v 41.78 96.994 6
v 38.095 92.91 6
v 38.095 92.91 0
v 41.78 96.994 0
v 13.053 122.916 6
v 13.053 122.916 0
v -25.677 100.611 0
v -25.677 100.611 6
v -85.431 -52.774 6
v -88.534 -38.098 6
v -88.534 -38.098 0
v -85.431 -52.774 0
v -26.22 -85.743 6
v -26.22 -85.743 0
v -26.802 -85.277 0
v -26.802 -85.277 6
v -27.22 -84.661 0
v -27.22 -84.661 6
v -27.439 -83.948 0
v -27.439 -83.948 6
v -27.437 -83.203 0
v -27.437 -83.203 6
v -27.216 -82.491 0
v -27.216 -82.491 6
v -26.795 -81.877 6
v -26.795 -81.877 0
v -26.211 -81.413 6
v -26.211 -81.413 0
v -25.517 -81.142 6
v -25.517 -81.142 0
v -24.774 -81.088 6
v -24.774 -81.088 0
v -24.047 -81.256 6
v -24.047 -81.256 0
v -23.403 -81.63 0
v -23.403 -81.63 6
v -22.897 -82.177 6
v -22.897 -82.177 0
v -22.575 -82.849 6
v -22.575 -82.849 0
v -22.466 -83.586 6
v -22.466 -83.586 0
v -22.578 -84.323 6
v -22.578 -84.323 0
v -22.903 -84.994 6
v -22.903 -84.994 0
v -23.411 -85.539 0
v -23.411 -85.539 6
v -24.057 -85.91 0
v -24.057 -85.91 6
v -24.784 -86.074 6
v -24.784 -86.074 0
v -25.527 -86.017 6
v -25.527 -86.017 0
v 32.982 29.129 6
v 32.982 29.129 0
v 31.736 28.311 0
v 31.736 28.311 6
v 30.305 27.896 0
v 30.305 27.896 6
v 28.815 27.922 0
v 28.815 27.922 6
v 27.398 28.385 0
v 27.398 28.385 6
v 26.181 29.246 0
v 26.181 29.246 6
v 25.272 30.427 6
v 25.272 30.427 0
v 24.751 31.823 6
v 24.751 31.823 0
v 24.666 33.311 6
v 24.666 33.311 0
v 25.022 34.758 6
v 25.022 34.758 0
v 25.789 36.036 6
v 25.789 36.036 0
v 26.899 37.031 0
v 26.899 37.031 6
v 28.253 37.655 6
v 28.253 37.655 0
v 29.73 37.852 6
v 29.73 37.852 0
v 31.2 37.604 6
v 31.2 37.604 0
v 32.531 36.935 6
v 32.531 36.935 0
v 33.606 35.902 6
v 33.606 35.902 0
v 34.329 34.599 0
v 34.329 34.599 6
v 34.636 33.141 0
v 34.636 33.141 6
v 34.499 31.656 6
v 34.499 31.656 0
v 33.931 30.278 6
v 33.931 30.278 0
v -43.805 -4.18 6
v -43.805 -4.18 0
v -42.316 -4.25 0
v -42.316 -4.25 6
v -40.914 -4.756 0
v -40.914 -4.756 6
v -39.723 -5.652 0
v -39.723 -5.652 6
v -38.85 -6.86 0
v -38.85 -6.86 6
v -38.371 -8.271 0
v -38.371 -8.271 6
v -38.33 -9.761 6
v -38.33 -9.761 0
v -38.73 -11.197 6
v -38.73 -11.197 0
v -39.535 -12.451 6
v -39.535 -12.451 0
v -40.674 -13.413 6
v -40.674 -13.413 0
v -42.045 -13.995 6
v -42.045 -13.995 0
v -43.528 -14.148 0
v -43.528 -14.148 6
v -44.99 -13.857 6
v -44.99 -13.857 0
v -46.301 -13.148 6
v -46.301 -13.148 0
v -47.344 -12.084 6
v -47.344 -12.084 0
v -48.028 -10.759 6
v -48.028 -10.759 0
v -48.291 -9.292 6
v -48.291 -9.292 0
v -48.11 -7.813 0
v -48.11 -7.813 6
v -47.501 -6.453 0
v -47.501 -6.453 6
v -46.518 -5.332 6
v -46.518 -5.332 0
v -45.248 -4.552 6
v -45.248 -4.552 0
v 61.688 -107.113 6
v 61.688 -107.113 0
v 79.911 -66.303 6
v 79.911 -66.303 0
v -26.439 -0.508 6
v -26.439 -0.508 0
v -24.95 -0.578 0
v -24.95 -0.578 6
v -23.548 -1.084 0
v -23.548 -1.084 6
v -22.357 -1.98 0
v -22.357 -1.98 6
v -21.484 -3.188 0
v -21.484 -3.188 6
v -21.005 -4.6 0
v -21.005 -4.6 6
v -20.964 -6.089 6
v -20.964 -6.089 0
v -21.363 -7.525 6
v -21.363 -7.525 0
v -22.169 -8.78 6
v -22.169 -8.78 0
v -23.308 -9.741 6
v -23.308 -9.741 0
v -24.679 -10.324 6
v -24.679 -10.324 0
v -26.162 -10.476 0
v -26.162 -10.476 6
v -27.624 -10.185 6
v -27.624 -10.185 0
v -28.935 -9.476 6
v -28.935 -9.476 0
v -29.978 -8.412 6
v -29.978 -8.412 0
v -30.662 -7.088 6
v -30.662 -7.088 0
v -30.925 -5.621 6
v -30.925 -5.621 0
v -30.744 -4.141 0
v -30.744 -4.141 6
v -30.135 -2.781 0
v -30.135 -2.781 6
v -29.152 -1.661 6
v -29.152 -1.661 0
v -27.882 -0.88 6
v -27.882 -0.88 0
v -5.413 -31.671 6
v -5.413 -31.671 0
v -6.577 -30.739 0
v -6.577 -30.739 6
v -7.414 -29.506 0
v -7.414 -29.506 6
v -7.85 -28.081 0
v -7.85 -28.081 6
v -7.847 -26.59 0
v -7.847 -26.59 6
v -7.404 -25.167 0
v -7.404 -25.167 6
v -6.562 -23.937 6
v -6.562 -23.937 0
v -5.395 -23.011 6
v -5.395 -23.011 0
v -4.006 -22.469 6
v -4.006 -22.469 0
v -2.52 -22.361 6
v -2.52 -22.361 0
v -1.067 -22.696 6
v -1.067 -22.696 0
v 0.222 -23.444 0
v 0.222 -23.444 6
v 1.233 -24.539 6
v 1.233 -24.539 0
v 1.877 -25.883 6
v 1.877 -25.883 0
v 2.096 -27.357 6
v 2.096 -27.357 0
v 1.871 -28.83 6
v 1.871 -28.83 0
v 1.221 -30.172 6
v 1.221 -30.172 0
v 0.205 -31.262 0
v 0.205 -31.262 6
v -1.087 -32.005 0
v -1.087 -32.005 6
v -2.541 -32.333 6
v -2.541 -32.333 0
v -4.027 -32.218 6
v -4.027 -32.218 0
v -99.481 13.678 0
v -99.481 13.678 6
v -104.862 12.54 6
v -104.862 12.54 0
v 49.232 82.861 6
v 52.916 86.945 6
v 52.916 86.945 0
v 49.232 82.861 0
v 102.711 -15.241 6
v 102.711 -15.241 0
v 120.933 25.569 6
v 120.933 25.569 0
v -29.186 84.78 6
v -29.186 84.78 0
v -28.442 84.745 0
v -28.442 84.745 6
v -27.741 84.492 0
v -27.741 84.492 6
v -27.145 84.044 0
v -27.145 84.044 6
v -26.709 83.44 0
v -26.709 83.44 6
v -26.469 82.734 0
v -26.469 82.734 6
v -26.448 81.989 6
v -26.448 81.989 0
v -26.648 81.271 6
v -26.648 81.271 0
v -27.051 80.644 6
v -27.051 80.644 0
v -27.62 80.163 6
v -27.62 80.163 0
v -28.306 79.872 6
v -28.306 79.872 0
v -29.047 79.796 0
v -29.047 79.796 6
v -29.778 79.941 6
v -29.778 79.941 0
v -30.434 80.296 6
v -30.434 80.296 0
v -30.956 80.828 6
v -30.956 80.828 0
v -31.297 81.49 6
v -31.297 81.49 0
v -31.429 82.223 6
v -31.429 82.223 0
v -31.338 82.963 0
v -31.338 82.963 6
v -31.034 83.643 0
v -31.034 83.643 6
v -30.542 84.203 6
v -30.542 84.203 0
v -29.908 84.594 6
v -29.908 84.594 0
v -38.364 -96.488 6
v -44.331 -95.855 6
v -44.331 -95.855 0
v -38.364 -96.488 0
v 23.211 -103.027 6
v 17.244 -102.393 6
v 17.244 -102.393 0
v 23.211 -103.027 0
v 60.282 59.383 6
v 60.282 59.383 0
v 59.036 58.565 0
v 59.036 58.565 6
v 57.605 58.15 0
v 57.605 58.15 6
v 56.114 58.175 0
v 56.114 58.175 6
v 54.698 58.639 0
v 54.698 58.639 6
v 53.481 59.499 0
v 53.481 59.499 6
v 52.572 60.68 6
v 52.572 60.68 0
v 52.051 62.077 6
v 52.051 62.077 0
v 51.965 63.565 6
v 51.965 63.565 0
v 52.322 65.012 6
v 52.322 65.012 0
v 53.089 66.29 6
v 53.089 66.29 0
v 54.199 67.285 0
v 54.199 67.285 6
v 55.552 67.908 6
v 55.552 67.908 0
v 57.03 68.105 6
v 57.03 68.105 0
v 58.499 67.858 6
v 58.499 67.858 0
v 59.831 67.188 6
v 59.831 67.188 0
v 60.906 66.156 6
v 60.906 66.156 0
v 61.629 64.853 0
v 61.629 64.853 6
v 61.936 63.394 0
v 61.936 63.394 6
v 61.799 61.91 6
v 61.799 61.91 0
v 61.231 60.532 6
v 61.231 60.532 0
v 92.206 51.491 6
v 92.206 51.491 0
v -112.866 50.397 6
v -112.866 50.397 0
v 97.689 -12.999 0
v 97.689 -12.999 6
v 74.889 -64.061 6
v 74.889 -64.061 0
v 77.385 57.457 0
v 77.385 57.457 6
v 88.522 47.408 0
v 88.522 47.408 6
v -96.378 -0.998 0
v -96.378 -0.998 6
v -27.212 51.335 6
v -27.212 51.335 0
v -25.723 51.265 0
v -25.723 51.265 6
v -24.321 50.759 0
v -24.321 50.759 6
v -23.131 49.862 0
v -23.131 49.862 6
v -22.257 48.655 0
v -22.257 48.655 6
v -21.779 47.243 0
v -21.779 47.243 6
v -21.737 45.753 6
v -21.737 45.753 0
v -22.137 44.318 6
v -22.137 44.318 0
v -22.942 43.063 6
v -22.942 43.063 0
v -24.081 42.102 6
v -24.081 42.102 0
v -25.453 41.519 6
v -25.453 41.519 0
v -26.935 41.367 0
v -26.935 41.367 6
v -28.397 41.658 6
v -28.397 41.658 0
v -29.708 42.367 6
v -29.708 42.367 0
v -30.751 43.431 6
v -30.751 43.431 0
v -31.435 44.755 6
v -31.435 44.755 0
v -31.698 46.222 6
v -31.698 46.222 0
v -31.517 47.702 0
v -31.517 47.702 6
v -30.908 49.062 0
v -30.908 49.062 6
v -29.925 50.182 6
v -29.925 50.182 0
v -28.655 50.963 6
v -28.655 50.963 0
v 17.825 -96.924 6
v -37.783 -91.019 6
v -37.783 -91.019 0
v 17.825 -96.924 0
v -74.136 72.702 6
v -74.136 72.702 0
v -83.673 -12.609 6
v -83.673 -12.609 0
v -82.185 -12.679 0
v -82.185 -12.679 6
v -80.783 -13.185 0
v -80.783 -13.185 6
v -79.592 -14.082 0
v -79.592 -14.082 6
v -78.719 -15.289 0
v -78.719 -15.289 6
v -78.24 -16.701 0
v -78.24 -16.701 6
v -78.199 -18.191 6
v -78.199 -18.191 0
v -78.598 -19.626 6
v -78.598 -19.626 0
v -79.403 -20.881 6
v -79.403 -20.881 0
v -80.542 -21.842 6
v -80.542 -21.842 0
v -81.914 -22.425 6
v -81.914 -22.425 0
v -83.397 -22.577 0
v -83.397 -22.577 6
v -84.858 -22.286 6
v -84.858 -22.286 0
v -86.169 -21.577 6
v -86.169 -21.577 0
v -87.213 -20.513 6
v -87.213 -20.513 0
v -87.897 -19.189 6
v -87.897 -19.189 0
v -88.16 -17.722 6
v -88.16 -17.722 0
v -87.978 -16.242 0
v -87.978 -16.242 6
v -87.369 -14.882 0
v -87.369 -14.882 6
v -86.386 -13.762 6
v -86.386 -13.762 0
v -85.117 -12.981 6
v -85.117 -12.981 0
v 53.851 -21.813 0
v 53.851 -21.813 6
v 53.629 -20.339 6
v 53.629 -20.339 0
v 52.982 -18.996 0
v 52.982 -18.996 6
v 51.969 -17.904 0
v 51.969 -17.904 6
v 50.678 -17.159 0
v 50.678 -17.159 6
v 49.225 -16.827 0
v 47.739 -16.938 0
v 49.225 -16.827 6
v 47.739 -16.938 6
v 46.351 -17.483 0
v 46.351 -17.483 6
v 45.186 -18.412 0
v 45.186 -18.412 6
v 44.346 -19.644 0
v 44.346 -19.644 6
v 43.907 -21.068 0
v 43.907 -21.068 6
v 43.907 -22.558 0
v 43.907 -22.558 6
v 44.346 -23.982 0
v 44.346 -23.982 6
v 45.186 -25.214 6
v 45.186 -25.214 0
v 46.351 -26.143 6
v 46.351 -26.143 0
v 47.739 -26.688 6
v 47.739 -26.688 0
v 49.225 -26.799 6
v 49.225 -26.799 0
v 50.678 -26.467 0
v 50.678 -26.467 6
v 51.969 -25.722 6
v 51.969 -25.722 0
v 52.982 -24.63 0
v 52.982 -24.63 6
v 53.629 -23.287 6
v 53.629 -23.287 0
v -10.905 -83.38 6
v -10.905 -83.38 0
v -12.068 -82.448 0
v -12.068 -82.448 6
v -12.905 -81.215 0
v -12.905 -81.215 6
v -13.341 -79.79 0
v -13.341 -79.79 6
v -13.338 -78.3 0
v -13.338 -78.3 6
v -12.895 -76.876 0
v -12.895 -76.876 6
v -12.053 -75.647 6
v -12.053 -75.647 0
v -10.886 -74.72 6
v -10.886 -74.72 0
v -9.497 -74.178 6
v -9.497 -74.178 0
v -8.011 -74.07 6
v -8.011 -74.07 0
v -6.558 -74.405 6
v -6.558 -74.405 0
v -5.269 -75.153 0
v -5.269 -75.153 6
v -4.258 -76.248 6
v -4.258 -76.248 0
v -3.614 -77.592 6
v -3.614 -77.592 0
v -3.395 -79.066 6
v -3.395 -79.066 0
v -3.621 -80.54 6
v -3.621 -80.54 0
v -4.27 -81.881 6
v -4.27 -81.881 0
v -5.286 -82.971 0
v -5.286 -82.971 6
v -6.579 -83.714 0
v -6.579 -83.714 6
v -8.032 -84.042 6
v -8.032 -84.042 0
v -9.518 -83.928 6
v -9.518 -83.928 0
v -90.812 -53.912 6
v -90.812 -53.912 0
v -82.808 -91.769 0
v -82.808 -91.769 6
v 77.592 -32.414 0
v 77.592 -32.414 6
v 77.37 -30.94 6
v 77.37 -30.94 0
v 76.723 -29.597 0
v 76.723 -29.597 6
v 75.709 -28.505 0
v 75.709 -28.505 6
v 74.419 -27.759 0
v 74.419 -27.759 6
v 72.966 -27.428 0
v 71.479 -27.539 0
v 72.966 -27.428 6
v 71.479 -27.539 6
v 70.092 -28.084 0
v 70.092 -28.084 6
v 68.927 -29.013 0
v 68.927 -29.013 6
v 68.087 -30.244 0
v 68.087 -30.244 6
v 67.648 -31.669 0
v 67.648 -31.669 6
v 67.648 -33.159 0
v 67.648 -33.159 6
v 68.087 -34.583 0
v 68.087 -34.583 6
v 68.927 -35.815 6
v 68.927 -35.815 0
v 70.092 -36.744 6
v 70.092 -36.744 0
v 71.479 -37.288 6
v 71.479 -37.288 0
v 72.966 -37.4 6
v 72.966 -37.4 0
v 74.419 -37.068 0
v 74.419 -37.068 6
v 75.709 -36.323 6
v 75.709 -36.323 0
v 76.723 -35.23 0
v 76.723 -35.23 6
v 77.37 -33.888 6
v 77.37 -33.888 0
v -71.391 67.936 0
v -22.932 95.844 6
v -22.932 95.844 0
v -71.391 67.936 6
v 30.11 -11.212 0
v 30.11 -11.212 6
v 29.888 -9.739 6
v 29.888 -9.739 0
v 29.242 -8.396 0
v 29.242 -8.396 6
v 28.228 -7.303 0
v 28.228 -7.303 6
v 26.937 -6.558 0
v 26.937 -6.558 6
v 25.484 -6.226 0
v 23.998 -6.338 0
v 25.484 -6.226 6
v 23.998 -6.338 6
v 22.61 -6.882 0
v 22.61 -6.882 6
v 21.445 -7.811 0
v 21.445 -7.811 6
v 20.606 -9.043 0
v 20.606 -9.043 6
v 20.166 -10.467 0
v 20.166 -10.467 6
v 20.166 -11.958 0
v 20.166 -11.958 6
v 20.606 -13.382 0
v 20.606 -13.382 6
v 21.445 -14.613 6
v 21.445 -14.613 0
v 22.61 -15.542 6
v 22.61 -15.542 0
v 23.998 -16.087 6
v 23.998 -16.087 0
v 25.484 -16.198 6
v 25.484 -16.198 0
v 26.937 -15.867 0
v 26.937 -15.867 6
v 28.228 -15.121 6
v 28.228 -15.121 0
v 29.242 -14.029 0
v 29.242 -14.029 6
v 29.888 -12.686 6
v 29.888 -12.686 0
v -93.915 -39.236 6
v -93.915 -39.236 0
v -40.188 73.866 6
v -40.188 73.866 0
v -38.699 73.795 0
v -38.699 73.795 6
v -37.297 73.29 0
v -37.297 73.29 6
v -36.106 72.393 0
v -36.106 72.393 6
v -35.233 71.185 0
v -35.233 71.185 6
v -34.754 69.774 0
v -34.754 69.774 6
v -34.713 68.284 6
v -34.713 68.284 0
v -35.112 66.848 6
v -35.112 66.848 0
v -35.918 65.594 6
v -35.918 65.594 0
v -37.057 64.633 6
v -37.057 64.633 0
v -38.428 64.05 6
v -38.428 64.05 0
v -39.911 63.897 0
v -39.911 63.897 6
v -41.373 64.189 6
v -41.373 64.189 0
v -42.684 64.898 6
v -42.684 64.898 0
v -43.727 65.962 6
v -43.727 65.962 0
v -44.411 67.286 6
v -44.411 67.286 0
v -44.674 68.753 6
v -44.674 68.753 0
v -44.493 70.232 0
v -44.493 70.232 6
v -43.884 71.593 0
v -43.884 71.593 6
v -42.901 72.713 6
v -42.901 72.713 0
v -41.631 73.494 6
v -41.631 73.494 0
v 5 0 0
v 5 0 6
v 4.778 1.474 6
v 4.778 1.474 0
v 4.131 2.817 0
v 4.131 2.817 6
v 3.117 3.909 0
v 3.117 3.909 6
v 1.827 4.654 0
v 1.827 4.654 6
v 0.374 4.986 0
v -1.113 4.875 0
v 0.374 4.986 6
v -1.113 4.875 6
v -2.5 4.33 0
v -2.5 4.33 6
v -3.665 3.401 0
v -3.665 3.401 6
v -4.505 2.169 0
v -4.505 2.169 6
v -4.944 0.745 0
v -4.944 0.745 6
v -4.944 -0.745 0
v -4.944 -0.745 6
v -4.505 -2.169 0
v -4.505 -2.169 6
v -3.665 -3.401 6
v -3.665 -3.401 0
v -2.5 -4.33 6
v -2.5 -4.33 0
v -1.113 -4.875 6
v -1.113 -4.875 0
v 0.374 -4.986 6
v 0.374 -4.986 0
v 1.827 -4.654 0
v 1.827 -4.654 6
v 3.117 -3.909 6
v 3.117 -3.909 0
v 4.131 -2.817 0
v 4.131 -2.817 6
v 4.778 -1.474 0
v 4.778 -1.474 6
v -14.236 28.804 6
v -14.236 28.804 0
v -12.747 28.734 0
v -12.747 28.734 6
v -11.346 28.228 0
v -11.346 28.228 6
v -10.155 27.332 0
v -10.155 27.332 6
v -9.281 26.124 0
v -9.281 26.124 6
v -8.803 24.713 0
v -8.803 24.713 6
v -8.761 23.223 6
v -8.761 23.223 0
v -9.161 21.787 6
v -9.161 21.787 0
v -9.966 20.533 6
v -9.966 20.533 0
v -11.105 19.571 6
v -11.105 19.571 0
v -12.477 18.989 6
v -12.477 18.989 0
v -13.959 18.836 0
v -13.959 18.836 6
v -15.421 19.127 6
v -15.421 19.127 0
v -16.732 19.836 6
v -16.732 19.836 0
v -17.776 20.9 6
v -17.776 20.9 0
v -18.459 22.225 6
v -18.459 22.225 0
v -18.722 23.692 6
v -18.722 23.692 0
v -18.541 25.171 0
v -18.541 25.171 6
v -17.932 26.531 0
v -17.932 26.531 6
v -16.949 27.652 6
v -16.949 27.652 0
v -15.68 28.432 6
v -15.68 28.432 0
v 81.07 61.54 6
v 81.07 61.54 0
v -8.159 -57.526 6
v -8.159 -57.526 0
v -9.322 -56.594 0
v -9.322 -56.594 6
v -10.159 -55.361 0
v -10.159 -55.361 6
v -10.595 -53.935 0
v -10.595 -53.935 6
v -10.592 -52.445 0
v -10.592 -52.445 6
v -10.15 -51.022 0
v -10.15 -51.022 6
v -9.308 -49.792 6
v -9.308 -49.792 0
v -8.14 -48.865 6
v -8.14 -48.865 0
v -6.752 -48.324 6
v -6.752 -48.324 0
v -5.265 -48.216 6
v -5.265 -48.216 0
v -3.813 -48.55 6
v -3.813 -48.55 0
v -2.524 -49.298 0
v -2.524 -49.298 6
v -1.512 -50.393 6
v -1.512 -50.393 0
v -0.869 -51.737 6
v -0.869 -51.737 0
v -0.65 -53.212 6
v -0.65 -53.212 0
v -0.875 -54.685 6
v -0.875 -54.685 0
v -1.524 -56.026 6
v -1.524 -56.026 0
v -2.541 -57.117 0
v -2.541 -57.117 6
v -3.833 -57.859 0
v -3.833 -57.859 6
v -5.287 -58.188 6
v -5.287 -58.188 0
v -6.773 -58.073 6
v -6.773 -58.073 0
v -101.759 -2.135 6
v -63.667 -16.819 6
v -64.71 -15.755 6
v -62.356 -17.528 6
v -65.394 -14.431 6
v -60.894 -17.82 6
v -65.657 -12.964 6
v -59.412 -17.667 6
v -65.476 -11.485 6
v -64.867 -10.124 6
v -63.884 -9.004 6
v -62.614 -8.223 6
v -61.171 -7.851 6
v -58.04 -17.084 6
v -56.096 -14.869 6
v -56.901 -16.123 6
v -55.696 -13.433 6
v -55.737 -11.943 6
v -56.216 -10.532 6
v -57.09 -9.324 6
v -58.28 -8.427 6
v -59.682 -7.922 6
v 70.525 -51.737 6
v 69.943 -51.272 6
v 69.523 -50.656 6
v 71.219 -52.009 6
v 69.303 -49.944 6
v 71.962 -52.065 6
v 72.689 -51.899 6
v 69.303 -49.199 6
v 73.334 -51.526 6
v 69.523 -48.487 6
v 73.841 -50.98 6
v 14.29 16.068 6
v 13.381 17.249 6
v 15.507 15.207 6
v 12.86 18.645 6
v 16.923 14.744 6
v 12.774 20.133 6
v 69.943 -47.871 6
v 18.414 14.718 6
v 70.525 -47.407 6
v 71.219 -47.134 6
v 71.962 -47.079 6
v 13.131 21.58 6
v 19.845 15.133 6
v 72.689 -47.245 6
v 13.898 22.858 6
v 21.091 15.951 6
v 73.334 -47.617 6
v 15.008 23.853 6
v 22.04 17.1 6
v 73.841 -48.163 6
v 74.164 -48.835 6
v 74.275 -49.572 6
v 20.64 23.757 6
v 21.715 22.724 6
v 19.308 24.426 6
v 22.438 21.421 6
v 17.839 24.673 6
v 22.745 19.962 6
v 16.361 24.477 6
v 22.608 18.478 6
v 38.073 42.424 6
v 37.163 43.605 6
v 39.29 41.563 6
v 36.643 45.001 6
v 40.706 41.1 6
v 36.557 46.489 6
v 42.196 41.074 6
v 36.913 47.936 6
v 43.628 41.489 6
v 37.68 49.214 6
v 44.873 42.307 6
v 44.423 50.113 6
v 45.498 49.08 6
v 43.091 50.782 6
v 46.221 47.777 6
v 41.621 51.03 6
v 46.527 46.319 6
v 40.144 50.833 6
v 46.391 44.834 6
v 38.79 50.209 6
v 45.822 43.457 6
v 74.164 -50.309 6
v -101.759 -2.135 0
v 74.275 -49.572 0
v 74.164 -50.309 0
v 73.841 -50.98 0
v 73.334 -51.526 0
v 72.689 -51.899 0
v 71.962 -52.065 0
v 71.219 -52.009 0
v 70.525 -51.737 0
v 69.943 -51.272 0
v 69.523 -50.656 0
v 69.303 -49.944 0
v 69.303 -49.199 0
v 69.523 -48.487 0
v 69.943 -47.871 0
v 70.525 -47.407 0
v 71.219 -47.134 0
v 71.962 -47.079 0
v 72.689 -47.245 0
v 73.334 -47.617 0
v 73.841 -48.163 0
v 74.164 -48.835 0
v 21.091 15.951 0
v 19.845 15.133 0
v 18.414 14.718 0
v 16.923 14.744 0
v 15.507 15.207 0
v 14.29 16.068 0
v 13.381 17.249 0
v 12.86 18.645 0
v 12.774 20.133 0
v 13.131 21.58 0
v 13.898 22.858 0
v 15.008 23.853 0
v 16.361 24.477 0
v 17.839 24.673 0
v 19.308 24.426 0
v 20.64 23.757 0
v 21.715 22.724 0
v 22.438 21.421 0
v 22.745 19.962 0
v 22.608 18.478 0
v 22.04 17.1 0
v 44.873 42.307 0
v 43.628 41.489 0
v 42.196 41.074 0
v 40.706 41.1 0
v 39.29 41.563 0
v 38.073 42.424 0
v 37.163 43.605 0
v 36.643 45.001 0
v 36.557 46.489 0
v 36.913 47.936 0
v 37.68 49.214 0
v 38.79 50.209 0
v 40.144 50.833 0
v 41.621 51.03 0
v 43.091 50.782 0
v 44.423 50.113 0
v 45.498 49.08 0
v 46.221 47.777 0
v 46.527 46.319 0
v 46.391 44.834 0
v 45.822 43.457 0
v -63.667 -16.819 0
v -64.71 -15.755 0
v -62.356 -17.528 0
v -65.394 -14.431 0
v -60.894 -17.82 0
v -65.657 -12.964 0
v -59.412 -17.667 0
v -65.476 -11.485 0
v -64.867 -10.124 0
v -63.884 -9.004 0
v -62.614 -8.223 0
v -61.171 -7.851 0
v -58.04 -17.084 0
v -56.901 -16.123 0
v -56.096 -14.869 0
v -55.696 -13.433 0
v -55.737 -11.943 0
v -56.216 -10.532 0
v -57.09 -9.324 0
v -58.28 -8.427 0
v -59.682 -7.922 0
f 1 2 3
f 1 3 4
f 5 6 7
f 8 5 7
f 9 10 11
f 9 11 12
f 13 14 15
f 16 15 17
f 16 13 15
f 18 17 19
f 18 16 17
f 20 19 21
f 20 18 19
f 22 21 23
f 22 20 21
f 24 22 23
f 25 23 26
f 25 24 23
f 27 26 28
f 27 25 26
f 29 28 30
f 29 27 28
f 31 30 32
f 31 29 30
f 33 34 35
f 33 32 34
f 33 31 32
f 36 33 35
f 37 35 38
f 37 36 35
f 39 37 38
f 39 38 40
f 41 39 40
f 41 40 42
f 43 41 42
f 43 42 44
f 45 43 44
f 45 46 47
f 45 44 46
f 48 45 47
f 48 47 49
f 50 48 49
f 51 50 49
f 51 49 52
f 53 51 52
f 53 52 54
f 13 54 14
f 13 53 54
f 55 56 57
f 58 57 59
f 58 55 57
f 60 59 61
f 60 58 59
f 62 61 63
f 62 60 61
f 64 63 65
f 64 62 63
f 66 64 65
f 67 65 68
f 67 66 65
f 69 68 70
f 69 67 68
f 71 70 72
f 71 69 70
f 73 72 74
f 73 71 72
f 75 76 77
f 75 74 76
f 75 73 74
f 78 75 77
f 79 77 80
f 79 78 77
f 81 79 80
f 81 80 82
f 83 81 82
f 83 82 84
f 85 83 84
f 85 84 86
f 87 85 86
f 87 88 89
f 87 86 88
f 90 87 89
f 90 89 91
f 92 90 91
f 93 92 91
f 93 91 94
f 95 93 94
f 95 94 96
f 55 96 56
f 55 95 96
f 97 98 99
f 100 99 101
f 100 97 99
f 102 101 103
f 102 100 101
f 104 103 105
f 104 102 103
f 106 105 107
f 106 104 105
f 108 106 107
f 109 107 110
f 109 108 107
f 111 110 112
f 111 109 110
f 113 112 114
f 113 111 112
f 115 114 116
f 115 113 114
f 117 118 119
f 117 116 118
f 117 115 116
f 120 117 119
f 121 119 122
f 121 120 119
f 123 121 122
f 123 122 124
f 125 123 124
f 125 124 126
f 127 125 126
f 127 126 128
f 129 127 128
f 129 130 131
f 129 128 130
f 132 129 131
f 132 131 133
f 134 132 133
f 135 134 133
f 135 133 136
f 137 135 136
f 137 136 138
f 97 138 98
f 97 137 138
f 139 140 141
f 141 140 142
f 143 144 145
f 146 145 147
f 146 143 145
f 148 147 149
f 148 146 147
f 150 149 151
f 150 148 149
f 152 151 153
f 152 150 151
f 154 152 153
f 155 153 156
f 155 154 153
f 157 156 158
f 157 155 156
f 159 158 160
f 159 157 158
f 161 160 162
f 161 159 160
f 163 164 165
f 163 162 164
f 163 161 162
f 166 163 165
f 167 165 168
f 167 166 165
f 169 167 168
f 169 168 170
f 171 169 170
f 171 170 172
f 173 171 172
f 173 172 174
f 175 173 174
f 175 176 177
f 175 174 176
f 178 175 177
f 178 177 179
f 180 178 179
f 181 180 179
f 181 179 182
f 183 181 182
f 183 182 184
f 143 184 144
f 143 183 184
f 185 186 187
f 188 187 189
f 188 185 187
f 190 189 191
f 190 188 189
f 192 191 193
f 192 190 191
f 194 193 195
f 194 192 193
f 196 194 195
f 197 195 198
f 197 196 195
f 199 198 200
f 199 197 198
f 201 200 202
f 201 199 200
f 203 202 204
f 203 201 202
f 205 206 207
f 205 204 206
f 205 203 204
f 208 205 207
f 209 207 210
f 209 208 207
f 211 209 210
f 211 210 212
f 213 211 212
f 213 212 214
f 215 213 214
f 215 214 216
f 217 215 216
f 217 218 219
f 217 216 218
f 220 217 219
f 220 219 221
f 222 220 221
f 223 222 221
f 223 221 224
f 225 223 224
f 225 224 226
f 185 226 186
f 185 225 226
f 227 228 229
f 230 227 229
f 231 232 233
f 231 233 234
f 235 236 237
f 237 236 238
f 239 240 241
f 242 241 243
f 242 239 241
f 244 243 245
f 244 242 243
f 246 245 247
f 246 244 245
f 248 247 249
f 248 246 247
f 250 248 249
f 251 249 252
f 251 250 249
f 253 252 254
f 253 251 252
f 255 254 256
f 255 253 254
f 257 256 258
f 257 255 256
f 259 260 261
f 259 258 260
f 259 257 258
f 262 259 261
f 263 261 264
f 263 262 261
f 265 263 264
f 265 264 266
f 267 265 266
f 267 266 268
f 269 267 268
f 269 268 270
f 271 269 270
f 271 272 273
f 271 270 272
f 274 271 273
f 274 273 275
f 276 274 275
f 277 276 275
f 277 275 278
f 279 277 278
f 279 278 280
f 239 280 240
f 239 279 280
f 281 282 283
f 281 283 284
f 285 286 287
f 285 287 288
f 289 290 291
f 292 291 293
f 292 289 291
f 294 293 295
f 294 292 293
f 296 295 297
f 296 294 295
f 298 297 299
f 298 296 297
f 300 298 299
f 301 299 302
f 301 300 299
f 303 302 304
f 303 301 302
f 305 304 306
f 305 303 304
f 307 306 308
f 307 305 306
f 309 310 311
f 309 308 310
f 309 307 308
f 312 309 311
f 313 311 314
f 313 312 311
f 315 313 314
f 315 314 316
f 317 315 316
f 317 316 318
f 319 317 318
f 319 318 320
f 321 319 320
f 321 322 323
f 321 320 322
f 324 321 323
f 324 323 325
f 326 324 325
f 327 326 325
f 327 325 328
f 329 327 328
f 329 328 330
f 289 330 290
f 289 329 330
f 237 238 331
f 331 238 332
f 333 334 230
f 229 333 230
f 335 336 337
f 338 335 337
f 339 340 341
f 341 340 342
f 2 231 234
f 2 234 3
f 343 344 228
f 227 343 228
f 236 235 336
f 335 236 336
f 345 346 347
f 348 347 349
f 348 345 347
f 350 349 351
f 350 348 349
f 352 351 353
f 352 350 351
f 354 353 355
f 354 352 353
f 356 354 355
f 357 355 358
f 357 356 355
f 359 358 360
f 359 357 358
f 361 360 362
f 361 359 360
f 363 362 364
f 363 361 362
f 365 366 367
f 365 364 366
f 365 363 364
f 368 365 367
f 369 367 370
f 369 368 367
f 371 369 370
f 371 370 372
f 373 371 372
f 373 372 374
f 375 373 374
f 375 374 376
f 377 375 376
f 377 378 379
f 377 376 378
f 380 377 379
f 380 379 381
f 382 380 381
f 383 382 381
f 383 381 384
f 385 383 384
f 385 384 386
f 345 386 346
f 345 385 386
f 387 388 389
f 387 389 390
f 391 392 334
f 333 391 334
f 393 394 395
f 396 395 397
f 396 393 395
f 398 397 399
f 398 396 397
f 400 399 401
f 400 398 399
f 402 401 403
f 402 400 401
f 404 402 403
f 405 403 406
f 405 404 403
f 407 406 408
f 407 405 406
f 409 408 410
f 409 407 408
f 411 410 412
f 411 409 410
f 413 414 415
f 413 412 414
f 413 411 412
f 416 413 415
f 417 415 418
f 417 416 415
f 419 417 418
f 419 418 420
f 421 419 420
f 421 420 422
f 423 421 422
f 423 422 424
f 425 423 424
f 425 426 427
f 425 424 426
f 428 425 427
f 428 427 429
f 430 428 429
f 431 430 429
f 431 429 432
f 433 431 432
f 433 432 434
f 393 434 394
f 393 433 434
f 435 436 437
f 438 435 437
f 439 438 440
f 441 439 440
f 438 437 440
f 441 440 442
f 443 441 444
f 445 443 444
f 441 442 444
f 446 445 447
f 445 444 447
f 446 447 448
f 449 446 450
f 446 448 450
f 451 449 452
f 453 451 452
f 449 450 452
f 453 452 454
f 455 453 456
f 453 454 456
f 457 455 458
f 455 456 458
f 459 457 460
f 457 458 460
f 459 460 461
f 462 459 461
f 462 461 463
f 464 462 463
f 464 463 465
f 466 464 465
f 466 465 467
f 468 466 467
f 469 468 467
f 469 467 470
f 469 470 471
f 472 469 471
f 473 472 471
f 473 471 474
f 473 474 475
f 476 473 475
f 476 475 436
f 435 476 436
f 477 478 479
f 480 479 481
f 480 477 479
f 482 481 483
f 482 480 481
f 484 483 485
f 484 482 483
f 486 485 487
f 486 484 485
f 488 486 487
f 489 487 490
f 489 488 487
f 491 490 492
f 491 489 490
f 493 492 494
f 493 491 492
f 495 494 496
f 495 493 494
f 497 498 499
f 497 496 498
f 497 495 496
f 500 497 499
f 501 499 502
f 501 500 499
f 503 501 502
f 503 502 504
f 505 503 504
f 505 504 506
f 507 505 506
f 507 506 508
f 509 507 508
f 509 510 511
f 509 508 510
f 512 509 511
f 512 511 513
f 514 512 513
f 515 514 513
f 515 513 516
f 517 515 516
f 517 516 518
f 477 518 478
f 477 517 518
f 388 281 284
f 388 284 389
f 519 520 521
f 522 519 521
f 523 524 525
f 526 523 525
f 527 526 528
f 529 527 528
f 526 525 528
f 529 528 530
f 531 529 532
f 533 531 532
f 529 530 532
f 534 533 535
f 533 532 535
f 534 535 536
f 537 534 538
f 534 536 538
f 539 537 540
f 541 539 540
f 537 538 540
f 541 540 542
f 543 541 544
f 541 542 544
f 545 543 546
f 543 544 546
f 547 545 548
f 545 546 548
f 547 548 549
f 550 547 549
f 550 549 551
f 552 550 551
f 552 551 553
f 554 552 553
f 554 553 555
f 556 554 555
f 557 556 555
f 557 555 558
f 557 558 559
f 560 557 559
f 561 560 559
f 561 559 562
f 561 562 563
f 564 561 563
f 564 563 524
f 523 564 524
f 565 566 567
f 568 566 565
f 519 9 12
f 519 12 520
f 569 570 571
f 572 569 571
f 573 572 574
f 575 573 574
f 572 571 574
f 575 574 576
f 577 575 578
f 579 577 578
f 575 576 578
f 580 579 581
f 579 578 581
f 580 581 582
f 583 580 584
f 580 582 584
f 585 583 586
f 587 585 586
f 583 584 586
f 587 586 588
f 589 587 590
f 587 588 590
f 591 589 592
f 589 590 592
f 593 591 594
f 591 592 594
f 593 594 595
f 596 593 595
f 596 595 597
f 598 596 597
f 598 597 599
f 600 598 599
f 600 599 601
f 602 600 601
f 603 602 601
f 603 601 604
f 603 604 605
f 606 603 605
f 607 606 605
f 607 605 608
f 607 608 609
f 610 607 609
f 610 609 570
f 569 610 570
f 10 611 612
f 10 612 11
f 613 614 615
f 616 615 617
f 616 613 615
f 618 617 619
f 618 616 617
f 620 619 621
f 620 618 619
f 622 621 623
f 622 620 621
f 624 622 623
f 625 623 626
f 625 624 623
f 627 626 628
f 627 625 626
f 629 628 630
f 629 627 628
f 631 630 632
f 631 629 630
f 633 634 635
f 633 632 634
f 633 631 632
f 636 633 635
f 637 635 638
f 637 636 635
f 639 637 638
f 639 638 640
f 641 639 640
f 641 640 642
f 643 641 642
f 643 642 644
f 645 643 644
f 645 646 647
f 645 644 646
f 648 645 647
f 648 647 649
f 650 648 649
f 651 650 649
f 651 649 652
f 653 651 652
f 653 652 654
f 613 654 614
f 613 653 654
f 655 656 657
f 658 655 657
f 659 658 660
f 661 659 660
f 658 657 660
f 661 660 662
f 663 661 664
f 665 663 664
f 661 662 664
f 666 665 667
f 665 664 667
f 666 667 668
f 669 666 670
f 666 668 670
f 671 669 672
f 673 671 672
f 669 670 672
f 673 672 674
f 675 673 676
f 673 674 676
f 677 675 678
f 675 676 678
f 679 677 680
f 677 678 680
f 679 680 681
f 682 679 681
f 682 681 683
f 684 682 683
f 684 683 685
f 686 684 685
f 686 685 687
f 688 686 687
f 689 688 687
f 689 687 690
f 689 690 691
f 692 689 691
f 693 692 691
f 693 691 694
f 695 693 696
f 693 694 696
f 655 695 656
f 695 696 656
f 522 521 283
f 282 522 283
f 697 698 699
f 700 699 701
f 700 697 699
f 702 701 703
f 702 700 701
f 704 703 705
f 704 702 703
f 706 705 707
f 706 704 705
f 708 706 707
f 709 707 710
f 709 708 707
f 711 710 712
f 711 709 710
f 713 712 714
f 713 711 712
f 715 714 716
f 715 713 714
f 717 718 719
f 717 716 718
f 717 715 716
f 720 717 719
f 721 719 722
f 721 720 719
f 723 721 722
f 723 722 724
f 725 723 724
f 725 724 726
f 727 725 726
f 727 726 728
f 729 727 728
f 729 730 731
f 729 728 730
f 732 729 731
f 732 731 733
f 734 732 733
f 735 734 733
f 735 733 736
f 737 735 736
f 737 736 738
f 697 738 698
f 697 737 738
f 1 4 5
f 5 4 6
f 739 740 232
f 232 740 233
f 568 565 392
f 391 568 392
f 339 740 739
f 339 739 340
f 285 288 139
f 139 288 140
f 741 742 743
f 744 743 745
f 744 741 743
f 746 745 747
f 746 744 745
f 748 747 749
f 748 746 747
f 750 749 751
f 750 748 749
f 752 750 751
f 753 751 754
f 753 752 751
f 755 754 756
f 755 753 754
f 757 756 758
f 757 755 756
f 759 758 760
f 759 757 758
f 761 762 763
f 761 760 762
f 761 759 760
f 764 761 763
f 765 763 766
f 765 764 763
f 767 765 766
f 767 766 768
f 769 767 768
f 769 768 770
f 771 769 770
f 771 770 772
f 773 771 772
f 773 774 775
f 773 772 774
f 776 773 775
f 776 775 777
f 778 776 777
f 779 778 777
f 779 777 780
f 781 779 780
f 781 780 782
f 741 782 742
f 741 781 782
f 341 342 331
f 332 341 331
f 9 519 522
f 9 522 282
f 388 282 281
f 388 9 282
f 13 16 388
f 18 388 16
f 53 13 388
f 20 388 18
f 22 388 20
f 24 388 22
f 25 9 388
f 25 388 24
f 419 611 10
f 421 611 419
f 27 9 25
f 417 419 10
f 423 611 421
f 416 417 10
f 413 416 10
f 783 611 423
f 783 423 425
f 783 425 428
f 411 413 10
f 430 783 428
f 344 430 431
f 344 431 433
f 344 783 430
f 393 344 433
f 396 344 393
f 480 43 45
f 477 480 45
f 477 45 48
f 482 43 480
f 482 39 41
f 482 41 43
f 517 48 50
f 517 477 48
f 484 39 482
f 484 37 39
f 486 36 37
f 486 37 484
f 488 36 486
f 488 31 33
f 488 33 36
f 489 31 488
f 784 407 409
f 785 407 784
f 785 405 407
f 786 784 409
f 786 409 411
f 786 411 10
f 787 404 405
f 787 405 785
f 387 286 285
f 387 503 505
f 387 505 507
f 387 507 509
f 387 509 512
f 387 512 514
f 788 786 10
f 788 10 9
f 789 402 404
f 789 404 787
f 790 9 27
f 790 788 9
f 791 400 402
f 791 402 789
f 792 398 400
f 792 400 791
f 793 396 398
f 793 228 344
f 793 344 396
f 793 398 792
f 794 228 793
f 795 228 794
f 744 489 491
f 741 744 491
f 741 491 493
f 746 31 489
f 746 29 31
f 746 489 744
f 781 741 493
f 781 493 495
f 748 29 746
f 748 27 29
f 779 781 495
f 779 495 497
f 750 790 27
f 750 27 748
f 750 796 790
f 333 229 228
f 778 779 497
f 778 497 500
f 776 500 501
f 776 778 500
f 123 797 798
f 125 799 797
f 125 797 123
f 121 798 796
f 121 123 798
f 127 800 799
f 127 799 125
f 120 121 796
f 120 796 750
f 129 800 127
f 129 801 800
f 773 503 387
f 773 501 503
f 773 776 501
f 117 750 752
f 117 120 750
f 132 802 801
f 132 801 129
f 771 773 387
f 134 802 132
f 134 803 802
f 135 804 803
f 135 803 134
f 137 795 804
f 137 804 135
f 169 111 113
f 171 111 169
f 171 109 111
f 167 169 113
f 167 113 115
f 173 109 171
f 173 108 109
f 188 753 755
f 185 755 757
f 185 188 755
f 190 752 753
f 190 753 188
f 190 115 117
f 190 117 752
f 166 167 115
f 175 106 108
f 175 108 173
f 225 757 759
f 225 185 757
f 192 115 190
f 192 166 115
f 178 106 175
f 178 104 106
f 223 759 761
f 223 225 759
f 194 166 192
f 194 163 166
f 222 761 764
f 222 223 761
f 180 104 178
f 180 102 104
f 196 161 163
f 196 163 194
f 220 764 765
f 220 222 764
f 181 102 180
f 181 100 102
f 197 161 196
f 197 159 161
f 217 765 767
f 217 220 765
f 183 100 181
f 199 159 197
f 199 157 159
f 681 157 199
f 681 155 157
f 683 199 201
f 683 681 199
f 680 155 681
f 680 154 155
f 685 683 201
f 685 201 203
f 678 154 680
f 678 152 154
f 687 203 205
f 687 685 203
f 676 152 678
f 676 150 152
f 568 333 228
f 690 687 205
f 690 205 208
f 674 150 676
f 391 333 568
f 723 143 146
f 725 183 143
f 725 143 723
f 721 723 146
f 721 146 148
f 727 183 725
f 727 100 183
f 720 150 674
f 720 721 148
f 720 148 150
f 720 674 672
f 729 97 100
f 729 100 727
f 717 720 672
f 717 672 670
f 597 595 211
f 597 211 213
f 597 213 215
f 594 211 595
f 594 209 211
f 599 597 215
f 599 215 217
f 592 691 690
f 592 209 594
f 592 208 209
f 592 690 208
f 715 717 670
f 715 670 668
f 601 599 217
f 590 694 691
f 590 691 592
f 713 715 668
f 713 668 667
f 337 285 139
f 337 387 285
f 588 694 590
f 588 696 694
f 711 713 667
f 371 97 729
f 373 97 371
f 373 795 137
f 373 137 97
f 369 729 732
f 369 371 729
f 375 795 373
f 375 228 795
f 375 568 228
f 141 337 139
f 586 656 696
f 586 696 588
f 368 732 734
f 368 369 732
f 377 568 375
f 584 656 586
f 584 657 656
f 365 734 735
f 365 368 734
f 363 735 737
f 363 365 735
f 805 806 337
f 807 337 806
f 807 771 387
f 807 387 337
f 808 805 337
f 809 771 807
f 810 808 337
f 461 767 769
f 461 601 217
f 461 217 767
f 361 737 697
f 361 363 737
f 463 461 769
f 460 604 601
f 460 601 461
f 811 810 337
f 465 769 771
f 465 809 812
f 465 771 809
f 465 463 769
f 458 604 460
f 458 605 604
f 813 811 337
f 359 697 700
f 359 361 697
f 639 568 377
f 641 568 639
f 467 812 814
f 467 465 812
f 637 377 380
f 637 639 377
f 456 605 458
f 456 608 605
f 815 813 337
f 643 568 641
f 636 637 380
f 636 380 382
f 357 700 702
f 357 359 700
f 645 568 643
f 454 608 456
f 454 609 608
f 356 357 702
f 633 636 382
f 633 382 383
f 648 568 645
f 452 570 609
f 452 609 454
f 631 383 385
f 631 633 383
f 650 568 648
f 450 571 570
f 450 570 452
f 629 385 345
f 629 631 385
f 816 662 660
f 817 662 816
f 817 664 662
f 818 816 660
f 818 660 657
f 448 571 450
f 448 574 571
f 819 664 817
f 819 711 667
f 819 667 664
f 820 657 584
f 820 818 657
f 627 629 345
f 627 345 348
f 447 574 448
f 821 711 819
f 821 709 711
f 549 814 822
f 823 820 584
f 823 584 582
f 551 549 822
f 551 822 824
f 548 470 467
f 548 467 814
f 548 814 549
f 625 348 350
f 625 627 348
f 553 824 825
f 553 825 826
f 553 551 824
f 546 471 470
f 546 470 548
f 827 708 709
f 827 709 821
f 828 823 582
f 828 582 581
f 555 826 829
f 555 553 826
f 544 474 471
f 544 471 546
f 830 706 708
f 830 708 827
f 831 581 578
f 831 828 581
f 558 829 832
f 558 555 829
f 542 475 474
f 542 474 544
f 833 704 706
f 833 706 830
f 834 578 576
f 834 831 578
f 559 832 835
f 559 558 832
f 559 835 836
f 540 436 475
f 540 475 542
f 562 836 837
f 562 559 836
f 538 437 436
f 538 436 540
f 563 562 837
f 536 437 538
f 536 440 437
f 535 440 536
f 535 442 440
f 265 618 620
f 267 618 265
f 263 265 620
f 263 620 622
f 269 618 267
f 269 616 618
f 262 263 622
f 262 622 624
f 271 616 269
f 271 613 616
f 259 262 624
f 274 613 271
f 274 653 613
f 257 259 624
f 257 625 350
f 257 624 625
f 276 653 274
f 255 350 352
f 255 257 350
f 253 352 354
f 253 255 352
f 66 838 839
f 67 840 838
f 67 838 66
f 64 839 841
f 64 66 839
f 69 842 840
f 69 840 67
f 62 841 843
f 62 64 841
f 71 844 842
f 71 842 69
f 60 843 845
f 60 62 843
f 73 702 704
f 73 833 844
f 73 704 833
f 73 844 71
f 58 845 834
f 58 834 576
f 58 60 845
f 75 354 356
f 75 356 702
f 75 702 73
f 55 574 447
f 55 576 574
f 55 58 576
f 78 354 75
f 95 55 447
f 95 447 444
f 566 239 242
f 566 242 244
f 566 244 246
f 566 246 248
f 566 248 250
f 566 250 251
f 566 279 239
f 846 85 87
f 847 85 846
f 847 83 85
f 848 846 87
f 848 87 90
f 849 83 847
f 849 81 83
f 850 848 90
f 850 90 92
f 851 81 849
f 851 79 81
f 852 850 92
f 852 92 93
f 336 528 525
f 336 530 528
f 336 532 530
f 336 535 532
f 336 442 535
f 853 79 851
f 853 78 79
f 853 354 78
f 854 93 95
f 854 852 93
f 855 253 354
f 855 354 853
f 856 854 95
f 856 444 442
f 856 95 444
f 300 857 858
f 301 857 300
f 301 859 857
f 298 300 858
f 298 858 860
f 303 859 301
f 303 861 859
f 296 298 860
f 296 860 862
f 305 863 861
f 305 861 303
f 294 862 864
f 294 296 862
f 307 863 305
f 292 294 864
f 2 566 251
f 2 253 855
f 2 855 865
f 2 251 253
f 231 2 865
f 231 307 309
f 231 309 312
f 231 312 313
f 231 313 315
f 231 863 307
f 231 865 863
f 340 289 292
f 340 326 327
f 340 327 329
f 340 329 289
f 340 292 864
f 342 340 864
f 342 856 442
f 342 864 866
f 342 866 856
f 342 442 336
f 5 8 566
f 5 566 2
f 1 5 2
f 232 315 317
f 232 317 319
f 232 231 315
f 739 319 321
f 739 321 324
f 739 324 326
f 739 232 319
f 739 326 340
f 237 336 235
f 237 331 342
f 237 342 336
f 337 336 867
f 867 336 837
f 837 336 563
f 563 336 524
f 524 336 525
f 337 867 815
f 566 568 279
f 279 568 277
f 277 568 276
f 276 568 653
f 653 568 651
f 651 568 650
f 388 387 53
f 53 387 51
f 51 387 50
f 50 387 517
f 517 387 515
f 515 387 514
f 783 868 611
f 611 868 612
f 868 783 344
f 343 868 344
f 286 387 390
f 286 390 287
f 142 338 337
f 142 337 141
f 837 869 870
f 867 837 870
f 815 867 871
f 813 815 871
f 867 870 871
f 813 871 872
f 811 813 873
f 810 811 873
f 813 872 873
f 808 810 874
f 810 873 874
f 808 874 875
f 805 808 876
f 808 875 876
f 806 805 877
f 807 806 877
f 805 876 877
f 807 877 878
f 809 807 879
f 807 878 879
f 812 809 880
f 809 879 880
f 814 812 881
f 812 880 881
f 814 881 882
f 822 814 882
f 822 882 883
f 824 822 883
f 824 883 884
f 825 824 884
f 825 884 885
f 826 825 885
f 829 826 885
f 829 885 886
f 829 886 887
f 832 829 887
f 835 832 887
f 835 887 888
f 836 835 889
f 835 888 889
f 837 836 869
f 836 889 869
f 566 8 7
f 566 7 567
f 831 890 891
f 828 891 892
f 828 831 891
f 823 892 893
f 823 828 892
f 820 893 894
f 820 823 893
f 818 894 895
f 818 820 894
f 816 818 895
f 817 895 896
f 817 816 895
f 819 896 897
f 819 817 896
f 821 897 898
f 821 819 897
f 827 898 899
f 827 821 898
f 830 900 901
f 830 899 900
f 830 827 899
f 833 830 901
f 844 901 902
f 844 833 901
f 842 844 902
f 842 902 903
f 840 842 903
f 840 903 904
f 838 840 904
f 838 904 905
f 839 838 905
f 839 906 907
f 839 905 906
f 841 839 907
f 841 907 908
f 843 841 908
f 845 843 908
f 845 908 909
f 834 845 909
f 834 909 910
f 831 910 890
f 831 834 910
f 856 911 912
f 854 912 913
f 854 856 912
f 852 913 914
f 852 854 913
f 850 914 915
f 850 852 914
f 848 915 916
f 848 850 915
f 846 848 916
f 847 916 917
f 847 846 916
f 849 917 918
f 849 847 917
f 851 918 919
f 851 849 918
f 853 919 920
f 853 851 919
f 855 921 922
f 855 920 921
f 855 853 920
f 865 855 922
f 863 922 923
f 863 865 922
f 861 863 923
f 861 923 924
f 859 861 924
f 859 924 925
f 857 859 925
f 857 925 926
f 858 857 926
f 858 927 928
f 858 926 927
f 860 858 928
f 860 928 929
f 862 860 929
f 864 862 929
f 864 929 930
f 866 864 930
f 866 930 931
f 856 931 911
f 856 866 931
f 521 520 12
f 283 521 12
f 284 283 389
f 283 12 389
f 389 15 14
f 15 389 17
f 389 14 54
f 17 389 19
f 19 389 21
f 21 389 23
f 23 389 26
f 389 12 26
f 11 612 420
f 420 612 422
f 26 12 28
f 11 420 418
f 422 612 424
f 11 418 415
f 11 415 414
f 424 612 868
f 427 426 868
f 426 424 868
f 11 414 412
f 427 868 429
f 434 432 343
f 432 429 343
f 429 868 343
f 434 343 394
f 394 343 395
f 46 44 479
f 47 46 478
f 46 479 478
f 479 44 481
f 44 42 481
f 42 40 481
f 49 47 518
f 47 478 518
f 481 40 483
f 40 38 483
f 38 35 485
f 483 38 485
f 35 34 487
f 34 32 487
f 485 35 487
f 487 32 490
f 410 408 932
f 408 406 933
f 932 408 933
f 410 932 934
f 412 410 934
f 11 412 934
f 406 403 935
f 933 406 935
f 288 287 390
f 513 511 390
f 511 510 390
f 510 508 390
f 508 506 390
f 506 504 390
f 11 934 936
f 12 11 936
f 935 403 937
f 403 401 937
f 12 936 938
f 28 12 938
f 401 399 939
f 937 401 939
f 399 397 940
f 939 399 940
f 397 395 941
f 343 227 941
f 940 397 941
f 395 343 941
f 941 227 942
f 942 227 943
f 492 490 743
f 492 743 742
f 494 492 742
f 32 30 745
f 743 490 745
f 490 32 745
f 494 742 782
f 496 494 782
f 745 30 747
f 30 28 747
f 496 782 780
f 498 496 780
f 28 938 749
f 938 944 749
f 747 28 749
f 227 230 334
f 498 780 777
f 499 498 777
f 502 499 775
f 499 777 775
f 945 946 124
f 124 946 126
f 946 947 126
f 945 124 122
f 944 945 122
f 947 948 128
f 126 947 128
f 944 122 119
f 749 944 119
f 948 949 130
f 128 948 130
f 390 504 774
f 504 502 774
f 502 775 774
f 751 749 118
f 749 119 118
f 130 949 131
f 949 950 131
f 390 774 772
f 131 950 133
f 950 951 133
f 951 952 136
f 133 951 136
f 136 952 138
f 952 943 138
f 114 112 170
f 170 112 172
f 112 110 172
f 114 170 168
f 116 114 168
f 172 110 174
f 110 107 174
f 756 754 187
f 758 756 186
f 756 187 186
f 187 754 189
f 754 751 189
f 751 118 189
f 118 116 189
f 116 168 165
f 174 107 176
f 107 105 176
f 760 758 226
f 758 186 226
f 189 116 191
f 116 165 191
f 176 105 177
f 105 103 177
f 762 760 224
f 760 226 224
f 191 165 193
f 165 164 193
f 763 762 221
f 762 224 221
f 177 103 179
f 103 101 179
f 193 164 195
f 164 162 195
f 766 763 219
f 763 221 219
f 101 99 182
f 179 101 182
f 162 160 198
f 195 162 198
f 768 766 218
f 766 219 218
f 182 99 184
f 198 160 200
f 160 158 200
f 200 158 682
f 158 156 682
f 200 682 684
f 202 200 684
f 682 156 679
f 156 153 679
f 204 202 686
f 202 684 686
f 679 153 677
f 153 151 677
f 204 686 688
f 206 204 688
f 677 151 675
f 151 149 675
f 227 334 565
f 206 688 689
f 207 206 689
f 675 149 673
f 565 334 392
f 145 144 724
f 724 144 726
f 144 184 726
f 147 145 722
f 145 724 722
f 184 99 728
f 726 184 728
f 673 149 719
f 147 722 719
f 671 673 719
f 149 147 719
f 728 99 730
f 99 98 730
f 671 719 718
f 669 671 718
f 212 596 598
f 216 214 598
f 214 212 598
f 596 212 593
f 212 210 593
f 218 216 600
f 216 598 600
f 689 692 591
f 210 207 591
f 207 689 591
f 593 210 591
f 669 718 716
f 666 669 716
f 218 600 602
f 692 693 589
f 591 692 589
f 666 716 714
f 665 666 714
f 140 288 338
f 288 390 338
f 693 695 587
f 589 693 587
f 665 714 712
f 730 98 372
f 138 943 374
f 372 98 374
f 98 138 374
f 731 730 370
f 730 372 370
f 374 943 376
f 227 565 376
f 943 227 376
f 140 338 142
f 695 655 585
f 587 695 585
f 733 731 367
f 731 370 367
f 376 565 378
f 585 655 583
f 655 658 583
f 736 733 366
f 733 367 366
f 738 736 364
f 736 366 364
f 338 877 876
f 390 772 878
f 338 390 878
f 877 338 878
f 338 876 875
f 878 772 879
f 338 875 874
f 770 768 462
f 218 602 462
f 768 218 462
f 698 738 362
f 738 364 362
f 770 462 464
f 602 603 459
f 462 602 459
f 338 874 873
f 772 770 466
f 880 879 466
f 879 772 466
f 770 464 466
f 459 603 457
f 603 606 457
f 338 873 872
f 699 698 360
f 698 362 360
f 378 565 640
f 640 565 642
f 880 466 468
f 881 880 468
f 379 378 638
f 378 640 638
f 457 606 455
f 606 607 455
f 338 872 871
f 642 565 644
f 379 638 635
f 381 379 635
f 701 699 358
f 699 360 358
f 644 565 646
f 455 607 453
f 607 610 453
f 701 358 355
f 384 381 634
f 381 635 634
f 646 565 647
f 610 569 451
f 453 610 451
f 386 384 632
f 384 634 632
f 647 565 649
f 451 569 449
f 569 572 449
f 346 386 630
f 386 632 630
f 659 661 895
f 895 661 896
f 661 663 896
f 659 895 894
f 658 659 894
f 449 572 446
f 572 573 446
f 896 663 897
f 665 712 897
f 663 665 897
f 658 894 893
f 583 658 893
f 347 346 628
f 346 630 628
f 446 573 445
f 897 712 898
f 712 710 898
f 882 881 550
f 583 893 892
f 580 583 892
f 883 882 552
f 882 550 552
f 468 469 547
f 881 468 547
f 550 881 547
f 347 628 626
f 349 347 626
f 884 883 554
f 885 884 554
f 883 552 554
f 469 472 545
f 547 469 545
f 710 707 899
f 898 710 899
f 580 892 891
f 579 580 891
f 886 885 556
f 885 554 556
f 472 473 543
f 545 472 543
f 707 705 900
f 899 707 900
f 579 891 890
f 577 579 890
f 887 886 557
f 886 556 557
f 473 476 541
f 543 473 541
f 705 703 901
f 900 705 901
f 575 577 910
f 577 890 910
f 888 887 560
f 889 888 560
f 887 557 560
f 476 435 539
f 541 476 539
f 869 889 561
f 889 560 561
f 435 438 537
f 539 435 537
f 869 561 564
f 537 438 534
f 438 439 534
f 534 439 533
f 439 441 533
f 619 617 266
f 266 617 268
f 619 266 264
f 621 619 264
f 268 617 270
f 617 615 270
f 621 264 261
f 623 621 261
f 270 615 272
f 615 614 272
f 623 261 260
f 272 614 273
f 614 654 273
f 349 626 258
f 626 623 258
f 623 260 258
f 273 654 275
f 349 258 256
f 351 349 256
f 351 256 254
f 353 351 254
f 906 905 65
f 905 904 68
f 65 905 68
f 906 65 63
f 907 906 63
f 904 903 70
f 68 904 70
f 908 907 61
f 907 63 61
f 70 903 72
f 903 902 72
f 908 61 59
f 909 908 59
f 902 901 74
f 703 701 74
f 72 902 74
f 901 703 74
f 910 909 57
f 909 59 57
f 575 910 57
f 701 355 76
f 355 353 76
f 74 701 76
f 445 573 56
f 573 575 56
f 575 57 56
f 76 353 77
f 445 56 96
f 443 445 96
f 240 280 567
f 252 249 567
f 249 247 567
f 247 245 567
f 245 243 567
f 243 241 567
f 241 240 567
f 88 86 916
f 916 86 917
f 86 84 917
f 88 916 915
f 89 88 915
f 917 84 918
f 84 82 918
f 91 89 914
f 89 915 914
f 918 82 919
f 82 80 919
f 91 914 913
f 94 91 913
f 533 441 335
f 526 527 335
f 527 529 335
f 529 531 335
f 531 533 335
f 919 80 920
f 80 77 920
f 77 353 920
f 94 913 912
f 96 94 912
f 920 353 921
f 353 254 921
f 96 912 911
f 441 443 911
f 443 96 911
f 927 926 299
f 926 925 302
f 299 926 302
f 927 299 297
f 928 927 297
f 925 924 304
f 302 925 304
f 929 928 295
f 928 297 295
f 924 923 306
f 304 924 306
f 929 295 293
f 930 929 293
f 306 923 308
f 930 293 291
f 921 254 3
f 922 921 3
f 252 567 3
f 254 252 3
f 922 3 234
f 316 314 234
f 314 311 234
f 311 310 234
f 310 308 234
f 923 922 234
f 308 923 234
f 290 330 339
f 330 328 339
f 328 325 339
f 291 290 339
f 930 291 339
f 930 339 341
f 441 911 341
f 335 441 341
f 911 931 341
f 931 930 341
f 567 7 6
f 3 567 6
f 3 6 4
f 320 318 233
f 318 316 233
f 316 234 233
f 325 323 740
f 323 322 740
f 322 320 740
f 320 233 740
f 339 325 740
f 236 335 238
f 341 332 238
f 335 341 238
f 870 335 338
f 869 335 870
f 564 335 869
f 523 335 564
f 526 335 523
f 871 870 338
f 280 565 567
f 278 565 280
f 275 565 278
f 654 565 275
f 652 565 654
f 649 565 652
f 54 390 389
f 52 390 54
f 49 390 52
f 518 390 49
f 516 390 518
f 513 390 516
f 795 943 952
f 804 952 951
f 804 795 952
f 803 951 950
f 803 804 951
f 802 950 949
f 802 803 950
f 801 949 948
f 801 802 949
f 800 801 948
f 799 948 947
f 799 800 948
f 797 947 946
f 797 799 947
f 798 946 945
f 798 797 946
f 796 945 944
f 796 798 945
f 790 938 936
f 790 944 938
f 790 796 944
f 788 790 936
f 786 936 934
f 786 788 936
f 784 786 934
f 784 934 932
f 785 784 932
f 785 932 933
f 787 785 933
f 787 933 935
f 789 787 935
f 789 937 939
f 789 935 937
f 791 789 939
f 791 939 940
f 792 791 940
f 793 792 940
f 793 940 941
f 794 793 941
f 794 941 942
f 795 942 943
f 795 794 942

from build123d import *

# Parameters (mm, degrees)
BOSS_EXTRUDE1_DEPTH = 6
SKETCH2_R           = 5
CUT_EXTRUDE1_DEPTH  = 6
SKETCH11_R          = 4.999999998
CUT_EXTRUDE2_DEPTH  = 10
SKETCH12_R          = 5
SKETCH12_R_2        = 2.5
CUT_EXTRUDE3_DEPTH  = 10
CUT_EXTRUDE4_DEPTH  = 10
CUT_EXTRUDE5_DEPTH  = 10
BOSS_EXTRUDE2_START = -6
SKETCH14_R          = 2.5
BOSS_EXTRUDE2_DEPTH = 6
SKETCH14_3_R        = 2.5
CUT_EXTRUDE6_DEPTH  = 6
SKETCH11_4_R        = 4.999999998
BOSS_EXTRUDE3_DEPTH = 6


with BuildPart() as part:
    # Sketch1 → Boss-Extrude1 (new body)
    with BuildSketch(Plane.XY):
        Polygon((-82.808015356, -91.768584182), (61.688025962, -107.113154668), (120.9333121, 25.569013955), (13.052871288, 122.915674351), (-112.866193993, 50.397050544), align=None)
    extrude(amount=BOSS_EXTRUDE1_DEPTH)

    # Sketch2 → Cut-Extrude1 (cut)
    with BuildSketch(Plane.XY.offset(6)):
        Circle(SKETCH2_R)
    extrude(amount=-CUT_EXTRUDE1_DEPTH, mode=Mode.SUBTRACT)

    # Sketch11 → Cut-Extrude2 (cut)
    with BuildSketch(Plane.XY.offset(6)):
        with Locations((-6.54719671, -61.653339044)):
            Circle(SKETCH11_R)
        with Locations((-4.672797652, -44.002584721)):
            Circle(SKETCH11_R)
        with Locations((-2.798398593, -26.351830398)):
            Circle(SKETCH11_R)
        with Locations((-8.975995491, -84.524739011)):
            Circle(SKETCH11_R)
    cut_extrude2 = extrude(amount=-CUT_EXTRUDE2_DEPTH, mode=Mode.SUBTRACT)

    # Sketch12 → Cut-Extrude3 (cut)
    with BuildSketch(Plane.XY.offset(6)):
        with Locations((48.851207931, -21.813057641)):
            Circle(SKETCH12_R)
        with Locations((25.110433983, -11.212319348)):
            Circle(SKETCH12_R)
        with Locations((84.822429951, -20.352343286)):
            Circle(SKETCH12_R_2)
        with Locations((72.591981879, -32.413795933)):
            Circle(SKETCH12_R)
    cut_extrude3 = extrude(amount=-CUT_EXTRUDE3_DEPTH, mode=Mode.SUBTRACT)

    # Sketch11<3> → Cut-Extrude4 (cut)
    with BuildSketch(Plane.XY.offset(6)):
        Polygon((8.29449613, -101.443097727), (8.875295839, -95.973849909), (23.791426251, -97.557849113), (23.210626543, -103.027096932), align=None)
        Polygon((-29.414485521, -97.438641123), (-28.833685813, -91.969393305), (-43.749816225, -90.3853941), (-44.330615934, -95.854641919), align=None)
    cut_extrude4 = extrude(amount=-CUT_EXTRUDE4_DEPTH, mode=Mode.SUBTRACT)

    # Mirror3: Cut-Extrude2 across plane
    add(cut_extrude2.mirror(Plane(origin=(0, 0, 0), x_dir=(0, 0, 1), z_dir=(-0.4077207035645653, -0.9131066903077734, 0))), mode=Mode.SUBTRACT)

    # Mirror4: Cut-Extrude3 across plane
    add(cut_extrude3.mirror(Plane(origin=(0, 0, 0), x_dir=(0, 0, 1), z_dir=(0.742423441529948, -0.6699309169360882, 0))), mode=Mode.SUBTRACT)

    # Mirror5: Cut-Extrude2 across plane
    add(cut_extrude2.mirror(Plane(origin=(0, 0, 0), x_dir=(0, 0, 1), z_dir=(0.742423441529948, -0.6699309169360882, 0))), mode=Mode.SUBTRACT)

    # Mirror6: Cut-Extrude4 across plane
    add(cut_extrude4.mirror(Plane(origin=(0, 0, 0), x_dir=(0, 0, 1), z_dir=(-0.4077207035645653, -0.9131066903077734, 0))), mode=Mode.SUBTRACT)

    # Mirror7: Cut-Extrude4 across plane
    add(cut_extrude4.mirror(Plane(origin=(0, 0, 0), x_dir=(0, 0, 1), z_dir=(0.742423441529948, -0.6699309169360882, 0))), mode=Mode.SUBTRACT)

    # Sketch13 → Cut-Extrude5 (cut)
    with BuildSketch(Plane.XY.offset(6)):
        Polygon((79.910592339, -66.30299436), (102.710745723, -15.241146353), (97.688658926, -12.998682483), (74.888505542, -64.060530491), align=None)
    cut_extrude5 = extrude(amount=-CUT_EXTRUDE5_DEPTH, mode=Mode.SUBTRACT)

    # Mirror8: Cut-Extrude5 across plane
    add(cut_extrude5.mirror(Plane(origin=(0, 0, 0), x_dir=(0, 0, 1), z_dir=(0.742423441529948, -0.6699309169360882, 0))), mode=Mode.SUBTRACT)

    # Sketch14 → Boss-Extrude2 (add)
    with BuildSketch(Plane(origin=(0, 0, 0), x_dir=(-1, 0, 0), z_dir=(0, 0, -1)).offset(BOSS_EXTRUDE2_START)):
        with Locations((-84.822429951, -20.352343286)):
            Circle(SKETCH14_R)
    extrude(amount=BOSS_EXTRUDE2_DEPTH)

    # Sketch14<3> → Cut-Extrude6 (cut)
    with BuildSketch(Plane(origin=(0, 0, 0), x_dir=(-1, 0, 0), z_dir=(0, 0, -1))):
        with Locations((-71.775367437, -49.571757376)):
            Circle(SKETCH14_3_R)
    extrude(amount=-CUT_EXTRUDE6_DEPTH, mode=Mode.SUBTRACT)

    # Sketch11<4> → Boss-Extrude3 (add)
    with BuildSketch(Plane.XY.offset(6)):
        Polygon((8.875295839, -95.973849909), (8.29449613, -101.443097727), (23.210626543, -103.027096932), (23.791426251, -97.557849113), align=None)
        Polygon((-44.330615934, -95.854641919), (-29.414485521, -97.438641123), (-28.833685813, -91.969393305), (-43.749816225, -90.3853941), align=None)
        with Locations((-6.54719671, -61.653339044)):
            Circle(SKETCH11_4_R)
        with Locations((-4.672797652, -44.002584721)):
            Circle(SKETCH11_4_R)
        with Locations((-2.798398593, -26.351830398)):
            Circle(SKETCH11_4_R)
        with Locations((-8.975995491, -84.524739011)):
            Circle(SKETCH11_4_R)
    extrude(amount=-BOSS_EXTRUDE3_DEPTH)

    # Mirror9: Cut-Extrude3, Cut-Extrude5 across plane
    add(cut_extrude3.mirror(Plane(origin=(0, 0, 0), x_dir=(0, 0, 1), z_dir=(0.8665636244747431, 0.4990666135268884, 0))), mode=Mode.SUBTRACT)
    add(cut_extrude5.mirror(Plane(origin=(0, 0, 0), x_dir=(0, 0, 1), z_dir=(0.8665636244747431, 0.4990666135268884, 0))), mode=Mode.SUBTRACT)


solid = part.part
